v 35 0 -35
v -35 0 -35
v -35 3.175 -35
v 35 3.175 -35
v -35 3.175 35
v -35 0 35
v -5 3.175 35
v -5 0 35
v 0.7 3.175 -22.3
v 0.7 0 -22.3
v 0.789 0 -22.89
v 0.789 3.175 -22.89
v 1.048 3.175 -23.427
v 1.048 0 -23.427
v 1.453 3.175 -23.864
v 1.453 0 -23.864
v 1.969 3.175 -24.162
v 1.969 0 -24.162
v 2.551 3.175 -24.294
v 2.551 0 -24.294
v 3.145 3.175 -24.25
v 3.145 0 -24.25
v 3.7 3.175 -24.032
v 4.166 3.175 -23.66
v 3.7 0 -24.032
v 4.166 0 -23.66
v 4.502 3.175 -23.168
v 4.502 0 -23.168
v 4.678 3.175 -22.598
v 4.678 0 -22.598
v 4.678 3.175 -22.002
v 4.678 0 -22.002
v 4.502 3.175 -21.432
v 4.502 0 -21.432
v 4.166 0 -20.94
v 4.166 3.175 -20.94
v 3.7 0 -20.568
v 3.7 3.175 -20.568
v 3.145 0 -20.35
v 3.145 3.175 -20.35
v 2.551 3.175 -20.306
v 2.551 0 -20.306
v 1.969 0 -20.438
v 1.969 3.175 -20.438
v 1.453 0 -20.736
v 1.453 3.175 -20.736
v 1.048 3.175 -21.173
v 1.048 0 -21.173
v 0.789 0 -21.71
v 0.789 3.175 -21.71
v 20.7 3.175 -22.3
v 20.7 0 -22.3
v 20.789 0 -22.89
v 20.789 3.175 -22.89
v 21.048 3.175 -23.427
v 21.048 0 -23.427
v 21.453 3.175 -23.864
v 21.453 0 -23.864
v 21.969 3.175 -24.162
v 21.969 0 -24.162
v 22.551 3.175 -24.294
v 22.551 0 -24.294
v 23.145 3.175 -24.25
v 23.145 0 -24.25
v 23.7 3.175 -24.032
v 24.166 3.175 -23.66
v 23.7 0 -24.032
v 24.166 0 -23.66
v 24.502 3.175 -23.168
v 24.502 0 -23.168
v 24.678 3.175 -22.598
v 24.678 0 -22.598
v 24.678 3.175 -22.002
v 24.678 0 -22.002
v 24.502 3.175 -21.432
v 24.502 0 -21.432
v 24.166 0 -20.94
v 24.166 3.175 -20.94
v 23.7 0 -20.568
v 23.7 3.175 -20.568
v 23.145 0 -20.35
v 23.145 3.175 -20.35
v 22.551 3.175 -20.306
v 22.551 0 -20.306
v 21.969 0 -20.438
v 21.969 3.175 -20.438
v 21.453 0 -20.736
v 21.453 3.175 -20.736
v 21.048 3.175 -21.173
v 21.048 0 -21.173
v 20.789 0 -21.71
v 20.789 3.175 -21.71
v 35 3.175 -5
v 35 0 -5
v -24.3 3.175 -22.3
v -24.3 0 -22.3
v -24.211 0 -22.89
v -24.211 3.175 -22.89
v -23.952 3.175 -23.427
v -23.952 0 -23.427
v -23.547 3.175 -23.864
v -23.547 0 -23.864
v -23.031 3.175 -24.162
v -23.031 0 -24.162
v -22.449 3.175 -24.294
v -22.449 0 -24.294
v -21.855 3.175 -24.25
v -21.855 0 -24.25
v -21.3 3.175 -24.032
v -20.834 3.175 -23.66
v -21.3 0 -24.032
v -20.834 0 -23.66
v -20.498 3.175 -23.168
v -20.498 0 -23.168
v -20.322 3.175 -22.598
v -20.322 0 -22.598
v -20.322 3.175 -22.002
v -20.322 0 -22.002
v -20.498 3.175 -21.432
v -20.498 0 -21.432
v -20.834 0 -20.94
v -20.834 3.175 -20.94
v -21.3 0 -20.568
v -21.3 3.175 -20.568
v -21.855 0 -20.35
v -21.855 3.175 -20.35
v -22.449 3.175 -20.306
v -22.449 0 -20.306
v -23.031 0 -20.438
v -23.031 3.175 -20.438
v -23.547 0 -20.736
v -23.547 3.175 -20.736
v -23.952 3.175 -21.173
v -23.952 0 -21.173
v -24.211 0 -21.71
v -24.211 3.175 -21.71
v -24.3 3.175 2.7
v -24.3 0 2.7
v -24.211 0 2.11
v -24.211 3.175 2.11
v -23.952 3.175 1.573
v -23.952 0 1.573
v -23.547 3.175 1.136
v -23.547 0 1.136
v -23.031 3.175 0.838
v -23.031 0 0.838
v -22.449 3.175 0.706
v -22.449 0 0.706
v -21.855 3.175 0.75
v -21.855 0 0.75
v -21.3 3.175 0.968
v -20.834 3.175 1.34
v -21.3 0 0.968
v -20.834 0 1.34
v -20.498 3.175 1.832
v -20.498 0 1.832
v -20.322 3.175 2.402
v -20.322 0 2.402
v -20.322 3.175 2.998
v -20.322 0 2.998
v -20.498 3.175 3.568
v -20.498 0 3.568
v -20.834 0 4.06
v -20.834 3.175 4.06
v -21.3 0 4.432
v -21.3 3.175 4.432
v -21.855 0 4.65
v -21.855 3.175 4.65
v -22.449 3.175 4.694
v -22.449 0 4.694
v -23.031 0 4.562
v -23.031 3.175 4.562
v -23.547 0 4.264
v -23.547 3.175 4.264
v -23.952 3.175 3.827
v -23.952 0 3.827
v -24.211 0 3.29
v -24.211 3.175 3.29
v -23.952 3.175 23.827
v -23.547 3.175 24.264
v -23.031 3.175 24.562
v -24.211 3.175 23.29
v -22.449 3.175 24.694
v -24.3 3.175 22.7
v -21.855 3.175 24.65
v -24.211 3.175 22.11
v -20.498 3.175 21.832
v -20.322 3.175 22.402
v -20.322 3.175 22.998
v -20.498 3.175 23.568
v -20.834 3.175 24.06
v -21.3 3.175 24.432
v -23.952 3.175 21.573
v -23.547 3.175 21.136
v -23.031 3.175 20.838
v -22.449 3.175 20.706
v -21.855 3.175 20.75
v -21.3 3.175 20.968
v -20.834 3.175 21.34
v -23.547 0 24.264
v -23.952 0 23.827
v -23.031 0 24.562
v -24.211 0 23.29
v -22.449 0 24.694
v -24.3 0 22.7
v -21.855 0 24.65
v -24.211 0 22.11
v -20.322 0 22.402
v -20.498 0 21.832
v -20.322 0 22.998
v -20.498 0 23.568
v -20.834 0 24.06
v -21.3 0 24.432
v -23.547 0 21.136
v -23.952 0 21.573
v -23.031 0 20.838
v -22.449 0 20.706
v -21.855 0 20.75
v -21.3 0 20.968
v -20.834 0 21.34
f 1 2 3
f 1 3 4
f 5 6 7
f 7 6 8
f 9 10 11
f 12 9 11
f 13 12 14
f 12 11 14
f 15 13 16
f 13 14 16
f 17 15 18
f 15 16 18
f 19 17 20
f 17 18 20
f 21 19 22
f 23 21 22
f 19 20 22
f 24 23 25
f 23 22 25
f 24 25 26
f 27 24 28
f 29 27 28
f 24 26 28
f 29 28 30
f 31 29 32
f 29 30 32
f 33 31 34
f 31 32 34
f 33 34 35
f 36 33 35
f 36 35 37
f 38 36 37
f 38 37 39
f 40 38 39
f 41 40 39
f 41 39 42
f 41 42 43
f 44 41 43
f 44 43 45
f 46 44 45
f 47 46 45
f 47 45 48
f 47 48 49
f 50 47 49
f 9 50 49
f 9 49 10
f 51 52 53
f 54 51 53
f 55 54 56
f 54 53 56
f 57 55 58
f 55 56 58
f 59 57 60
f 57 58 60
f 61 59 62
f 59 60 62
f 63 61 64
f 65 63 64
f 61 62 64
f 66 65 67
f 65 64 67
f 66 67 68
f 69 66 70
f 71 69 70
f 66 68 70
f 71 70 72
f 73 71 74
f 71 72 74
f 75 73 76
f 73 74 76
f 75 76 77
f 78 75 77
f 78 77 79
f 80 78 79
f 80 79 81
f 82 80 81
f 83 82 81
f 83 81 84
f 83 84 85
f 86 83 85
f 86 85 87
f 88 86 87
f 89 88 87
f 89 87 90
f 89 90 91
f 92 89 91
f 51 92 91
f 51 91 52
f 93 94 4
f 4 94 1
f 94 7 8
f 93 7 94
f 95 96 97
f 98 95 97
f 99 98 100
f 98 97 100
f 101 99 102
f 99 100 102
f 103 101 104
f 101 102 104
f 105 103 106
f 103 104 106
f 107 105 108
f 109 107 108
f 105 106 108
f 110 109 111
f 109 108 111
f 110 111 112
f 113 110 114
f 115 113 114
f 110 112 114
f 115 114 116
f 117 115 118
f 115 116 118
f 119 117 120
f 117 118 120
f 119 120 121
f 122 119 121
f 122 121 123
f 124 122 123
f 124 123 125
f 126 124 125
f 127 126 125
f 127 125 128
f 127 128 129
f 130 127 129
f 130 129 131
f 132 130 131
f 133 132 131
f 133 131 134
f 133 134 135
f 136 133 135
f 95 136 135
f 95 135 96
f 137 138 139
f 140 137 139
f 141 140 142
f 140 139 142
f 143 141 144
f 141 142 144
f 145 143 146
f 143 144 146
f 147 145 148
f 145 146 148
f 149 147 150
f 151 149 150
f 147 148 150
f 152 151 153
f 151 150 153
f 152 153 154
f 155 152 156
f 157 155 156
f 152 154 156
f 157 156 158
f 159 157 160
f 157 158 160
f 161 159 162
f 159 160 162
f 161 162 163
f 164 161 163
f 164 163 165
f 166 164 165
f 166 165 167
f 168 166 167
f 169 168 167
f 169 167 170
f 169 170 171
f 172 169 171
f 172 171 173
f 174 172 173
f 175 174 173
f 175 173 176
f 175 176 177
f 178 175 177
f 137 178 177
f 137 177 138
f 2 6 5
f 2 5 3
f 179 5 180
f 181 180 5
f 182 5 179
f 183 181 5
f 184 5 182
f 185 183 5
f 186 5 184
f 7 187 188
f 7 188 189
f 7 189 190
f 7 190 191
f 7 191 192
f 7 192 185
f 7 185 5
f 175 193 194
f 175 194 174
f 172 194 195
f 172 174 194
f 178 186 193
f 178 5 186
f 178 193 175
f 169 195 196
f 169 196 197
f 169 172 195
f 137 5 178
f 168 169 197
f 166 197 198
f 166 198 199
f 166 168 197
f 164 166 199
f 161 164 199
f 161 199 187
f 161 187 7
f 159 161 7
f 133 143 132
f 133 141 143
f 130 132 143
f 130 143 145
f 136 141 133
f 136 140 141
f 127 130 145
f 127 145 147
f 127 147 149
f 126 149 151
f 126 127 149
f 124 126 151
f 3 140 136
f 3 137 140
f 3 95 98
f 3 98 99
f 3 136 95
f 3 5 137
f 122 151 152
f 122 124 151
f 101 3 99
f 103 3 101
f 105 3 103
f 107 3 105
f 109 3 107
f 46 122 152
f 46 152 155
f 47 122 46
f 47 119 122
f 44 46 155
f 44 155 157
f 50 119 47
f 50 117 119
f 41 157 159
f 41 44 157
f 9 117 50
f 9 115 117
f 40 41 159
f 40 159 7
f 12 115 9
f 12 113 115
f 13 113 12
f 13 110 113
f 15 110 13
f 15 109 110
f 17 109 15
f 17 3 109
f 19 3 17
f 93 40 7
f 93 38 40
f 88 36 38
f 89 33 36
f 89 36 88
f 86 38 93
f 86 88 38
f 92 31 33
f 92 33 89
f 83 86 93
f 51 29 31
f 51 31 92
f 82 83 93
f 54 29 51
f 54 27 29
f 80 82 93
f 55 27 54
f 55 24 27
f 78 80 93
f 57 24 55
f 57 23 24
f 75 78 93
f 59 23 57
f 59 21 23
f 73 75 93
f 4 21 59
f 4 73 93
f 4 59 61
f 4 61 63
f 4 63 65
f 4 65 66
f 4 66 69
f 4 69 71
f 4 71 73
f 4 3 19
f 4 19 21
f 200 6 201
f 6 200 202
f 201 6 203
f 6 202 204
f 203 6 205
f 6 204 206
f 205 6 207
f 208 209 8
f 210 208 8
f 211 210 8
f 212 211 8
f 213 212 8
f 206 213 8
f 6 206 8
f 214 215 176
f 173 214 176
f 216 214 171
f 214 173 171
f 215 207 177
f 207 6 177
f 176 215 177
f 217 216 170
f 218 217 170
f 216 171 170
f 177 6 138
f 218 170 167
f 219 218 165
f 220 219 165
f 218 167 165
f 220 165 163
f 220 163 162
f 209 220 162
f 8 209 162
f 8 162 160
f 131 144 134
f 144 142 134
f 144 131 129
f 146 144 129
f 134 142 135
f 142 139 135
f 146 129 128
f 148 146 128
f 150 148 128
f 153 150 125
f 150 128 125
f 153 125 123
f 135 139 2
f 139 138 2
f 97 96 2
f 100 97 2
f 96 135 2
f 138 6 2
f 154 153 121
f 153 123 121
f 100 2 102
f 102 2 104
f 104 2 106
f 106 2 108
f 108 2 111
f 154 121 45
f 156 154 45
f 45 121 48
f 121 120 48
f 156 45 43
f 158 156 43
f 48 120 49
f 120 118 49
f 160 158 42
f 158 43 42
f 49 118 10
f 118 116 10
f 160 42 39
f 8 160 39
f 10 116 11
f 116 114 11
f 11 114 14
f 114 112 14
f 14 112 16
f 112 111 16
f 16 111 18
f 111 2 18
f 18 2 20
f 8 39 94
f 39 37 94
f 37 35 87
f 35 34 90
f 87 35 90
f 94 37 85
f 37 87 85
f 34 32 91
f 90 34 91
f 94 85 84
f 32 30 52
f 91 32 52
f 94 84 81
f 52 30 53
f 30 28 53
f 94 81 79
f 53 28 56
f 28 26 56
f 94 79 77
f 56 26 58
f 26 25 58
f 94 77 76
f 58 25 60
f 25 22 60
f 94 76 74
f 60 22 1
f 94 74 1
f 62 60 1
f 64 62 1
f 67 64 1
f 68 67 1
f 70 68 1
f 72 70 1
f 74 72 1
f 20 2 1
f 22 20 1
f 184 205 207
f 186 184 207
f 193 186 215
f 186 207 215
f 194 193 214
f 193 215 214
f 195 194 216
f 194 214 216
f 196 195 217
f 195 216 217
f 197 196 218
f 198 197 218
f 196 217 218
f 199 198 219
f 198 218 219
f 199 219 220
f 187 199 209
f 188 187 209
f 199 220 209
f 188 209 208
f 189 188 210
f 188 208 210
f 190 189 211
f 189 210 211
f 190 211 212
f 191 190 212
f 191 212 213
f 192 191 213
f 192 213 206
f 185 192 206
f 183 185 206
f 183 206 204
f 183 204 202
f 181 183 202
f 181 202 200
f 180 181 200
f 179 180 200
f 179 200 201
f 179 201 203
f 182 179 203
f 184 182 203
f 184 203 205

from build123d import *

# Parameters (mm, degrees)
SKETCH2_W             = 70
SKETCH2_H             = 70
BOSS_EXTRUDE1_DEPTH   = 3.175
F_4_0MM_DOWEL_HOLE1_D = 4
CUT_EXTRUDE1_DEPTH    = 50.599199842


with BuildPart() as part:
    # Sketch2 → Boss-Extrude1 (new body)
    with BuildSketch(Plane(origin=(0, 0, 0), x_dir=(1, 0, 0), z_dir=(0, 1, 0))):
        Rectangle(SKETCH2_W, SKETCH2_H)
    extrude(amount=BOSS_EXTRUDE1_DEPTH)

    # Ø4.0mm Dowel Hole1 (through all)
    with Locations(Plane(origin=(0, 3.175, 0), x_dir=(1, 0, 0), z_dir=(0, 1, 0))):
        with Locations((-22.3, 22.3), (22.7, 22.3), (2.7, 22.3), (-22.3, -2.7), (-22.3, -22.7)):
            Hole(F_4_0MM_DOWEL_HOLE1_D / 2)

    # Sketch8 → Cut-Extrude1 (cut, through all)
    with BuildSketch(Plane(origin=(0, 3.175, 0), x_dir=(1, 0, 0), z_dir=(0, 1, 0))):
        Polygon((-5, -35), (35, 5), (35, -35), align=None)
    extrude(amount=-CUT_EXTRUDE1_DEPTH, mode=Mode.SUBTRACT)


solid = part.part
